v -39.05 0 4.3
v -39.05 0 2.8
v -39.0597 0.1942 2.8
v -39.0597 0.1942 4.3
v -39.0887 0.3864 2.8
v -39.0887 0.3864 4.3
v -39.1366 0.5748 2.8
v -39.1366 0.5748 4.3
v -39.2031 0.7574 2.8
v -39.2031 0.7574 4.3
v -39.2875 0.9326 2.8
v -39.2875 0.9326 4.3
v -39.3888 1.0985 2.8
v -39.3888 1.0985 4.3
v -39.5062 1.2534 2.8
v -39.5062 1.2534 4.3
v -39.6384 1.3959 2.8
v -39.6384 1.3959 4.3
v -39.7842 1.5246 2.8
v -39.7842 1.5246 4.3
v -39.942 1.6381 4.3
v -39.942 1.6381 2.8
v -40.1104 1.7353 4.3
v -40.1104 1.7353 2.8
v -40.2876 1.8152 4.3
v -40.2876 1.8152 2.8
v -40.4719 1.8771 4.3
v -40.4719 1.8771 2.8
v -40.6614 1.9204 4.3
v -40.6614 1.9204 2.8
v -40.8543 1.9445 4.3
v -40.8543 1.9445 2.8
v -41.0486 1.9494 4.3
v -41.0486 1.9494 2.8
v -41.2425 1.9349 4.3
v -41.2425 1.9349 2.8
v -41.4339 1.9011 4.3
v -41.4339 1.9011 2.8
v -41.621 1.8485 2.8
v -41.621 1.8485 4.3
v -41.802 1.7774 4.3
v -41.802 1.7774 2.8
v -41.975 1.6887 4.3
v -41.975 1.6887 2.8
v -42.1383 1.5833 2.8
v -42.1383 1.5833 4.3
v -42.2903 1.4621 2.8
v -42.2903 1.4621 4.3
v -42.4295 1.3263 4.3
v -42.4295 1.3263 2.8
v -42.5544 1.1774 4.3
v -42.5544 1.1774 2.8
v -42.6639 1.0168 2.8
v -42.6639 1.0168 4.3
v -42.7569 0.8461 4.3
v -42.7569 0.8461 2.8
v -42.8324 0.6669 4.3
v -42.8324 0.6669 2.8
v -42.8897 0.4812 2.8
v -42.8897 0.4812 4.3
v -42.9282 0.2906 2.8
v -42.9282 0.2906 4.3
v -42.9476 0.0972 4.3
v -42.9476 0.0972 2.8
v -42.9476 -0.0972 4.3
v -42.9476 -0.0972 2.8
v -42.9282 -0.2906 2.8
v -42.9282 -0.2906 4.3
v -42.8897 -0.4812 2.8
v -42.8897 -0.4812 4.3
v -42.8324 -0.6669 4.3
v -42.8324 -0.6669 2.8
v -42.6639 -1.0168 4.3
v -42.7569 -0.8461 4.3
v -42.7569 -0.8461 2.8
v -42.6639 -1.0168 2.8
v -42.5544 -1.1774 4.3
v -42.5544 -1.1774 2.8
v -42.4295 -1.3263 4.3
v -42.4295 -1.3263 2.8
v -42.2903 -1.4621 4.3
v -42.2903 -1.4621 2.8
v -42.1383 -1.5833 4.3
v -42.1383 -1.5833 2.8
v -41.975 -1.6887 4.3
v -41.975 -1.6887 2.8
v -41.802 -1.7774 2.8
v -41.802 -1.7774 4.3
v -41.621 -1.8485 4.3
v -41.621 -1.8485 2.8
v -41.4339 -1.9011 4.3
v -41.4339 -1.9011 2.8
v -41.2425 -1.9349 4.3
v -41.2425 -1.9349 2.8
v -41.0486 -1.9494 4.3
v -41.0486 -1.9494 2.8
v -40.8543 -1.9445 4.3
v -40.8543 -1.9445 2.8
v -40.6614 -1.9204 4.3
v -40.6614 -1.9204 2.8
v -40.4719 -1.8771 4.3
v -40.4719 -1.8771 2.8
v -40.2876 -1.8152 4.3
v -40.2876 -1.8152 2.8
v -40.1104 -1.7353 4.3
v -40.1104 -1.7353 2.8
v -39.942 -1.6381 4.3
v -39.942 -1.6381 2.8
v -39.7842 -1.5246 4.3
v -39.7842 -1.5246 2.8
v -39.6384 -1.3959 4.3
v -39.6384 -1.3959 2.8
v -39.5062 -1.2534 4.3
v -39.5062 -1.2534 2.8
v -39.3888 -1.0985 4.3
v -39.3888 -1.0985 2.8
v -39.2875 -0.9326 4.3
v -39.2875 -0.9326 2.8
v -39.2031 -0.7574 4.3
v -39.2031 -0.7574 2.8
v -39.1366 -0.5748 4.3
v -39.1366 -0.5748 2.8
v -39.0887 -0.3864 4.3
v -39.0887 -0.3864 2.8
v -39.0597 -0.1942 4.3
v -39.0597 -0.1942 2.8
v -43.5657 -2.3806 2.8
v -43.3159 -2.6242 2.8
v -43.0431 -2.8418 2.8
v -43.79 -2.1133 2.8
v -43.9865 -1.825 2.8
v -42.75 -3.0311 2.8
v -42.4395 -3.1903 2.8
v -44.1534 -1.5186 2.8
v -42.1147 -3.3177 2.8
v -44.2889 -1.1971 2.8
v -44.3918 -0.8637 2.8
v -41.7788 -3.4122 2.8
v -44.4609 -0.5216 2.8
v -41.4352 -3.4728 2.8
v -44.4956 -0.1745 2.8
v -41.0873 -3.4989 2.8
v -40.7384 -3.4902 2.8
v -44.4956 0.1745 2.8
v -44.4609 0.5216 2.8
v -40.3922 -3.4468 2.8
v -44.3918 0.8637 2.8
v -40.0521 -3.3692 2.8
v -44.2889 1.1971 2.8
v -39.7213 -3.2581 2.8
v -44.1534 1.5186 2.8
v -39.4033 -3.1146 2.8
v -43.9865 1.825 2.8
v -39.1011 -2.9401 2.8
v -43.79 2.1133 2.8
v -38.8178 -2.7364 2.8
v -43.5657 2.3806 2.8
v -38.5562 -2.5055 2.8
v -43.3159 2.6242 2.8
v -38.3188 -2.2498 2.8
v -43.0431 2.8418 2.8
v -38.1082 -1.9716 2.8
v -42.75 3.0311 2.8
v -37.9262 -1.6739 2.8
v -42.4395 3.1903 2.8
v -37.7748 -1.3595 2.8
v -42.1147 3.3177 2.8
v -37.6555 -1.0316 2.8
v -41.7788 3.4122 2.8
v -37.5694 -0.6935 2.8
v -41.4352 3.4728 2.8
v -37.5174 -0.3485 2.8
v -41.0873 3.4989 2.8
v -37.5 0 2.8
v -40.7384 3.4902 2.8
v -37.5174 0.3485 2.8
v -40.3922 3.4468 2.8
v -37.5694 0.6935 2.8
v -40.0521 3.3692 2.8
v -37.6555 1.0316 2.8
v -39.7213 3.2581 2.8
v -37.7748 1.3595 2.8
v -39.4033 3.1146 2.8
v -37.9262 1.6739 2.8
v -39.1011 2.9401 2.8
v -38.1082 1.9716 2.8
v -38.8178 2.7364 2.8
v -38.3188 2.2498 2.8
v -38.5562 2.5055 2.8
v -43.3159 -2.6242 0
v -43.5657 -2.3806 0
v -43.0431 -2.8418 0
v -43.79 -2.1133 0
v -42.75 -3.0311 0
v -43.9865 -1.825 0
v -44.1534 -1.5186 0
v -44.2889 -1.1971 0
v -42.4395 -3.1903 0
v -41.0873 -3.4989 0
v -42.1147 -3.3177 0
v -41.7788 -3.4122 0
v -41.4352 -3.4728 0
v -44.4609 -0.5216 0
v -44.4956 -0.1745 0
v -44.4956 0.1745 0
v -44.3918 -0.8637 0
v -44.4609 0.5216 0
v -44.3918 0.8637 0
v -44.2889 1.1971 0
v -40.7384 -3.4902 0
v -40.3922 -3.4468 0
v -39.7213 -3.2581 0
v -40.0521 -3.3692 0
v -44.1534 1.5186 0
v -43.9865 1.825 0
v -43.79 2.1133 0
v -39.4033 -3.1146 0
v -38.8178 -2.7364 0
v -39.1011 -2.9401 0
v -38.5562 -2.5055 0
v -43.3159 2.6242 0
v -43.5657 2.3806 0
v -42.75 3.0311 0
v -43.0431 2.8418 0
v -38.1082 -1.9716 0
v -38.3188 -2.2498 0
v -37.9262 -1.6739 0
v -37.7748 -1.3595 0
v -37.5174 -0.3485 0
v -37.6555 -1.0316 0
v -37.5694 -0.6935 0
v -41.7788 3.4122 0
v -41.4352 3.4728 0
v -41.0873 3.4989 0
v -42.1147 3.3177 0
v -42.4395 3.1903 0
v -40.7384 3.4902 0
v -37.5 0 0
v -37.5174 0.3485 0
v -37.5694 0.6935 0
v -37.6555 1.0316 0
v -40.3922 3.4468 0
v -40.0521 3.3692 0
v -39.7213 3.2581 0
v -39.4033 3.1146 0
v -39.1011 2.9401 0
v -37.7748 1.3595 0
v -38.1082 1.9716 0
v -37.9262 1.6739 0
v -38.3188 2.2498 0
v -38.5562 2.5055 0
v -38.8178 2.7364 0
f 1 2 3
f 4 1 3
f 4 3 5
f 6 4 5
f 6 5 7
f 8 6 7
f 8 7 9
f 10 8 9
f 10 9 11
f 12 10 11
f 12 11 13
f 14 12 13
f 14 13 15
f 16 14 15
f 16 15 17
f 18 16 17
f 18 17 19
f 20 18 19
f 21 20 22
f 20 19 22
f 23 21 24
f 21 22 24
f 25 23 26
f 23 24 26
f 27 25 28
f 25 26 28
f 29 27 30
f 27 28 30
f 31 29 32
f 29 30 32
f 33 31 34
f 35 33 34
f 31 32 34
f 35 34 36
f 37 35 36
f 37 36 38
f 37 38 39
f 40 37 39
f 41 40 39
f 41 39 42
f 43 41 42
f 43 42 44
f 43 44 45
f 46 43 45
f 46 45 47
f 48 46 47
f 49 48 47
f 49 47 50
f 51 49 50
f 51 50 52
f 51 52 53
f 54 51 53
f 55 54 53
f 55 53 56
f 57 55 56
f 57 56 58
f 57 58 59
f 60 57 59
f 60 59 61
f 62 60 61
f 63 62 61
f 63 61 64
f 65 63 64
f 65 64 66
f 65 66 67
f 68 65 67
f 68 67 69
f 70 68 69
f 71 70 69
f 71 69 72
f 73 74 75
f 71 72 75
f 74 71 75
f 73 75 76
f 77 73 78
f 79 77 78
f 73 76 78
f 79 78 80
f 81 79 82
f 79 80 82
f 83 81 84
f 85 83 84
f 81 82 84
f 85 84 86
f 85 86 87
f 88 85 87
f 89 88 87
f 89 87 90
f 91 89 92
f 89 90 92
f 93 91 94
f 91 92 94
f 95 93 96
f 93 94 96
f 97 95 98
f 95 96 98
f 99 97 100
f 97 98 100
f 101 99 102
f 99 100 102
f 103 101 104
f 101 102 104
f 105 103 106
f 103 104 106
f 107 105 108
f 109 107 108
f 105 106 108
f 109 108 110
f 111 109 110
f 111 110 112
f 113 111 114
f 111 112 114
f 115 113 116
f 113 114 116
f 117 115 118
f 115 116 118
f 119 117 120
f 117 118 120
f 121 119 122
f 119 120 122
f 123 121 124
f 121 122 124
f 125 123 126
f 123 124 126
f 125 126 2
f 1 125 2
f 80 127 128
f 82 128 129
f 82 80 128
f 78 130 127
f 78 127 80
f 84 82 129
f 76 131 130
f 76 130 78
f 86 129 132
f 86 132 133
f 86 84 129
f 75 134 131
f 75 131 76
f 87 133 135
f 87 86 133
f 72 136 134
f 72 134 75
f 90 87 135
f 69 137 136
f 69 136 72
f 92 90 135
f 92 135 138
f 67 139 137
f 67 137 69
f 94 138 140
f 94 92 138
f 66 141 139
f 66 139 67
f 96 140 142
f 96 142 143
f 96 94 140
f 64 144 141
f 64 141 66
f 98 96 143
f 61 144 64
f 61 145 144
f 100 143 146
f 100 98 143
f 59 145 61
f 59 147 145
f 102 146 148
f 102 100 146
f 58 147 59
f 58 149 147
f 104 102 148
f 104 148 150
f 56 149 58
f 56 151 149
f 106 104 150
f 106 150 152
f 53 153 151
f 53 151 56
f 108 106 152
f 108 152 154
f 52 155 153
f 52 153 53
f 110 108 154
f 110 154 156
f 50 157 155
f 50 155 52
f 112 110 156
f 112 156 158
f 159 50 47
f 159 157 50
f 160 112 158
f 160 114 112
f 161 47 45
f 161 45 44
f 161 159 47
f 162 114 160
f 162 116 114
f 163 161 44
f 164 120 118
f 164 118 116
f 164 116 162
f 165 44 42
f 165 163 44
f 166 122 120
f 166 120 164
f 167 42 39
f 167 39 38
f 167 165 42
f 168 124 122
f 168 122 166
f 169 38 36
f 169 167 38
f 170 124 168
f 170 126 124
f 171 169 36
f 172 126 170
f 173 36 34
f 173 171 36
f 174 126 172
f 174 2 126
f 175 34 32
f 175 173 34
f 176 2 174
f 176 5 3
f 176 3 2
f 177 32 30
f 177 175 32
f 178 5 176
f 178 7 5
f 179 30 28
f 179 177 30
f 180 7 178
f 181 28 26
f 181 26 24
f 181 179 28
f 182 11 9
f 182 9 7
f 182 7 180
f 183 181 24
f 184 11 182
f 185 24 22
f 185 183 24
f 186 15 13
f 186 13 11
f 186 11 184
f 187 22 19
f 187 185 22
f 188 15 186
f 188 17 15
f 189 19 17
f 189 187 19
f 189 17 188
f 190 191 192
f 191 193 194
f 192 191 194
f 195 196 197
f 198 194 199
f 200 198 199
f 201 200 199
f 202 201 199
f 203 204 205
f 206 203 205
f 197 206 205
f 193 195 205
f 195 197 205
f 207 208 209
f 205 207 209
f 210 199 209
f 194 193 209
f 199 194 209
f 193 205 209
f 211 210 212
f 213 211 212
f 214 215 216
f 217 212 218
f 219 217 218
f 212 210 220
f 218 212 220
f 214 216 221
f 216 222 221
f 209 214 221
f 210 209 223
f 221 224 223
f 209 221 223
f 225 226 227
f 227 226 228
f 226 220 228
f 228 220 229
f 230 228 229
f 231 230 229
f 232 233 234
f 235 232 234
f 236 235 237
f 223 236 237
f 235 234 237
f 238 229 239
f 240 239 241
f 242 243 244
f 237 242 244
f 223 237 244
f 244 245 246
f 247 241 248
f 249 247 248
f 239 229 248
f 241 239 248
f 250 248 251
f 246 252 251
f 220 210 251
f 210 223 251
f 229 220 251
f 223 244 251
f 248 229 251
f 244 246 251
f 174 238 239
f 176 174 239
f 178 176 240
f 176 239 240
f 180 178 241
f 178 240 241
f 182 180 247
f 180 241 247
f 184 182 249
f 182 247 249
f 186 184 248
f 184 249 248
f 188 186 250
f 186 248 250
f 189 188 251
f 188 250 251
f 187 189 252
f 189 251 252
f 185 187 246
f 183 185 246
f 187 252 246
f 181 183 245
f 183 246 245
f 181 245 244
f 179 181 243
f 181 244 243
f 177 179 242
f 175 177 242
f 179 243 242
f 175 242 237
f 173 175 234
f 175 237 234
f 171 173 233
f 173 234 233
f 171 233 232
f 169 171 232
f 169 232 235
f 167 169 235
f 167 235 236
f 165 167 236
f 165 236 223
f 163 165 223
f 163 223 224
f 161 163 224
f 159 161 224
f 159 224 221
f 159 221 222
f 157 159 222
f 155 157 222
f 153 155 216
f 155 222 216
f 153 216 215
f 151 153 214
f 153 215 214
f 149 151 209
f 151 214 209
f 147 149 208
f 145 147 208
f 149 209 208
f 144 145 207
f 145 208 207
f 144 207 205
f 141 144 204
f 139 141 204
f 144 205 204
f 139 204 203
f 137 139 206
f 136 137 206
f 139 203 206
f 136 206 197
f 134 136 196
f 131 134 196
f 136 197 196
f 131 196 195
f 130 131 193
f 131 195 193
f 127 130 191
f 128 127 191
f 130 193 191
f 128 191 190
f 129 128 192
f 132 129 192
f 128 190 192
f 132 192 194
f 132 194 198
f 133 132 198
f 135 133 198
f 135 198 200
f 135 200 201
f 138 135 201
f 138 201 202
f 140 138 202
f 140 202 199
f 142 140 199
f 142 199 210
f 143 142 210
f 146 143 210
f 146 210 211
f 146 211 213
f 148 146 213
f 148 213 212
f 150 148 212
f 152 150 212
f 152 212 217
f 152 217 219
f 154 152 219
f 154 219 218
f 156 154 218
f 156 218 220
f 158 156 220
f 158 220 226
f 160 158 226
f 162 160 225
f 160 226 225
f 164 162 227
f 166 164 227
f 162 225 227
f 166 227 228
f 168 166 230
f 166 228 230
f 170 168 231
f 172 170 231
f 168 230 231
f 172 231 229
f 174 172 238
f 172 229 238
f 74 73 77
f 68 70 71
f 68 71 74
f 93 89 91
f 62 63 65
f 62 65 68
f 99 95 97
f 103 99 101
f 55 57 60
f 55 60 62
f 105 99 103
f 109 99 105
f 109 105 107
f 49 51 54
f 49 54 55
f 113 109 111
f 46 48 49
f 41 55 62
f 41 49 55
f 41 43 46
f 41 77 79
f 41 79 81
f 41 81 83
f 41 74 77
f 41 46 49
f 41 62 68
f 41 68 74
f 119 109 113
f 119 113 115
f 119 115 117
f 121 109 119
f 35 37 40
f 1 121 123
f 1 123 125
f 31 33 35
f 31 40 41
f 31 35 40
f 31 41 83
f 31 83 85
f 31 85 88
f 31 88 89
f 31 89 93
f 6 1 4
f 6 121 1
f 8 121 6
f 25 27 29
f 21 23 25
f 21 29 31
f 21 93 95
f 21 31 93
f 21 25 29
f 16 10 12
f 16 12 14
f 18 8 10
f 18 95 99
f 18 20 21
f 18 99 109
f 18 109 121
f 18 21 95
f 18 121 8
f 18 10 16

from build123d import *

# Parameters (mm, degrees)
CYLINDER005_R     = 1.95
CYLINDER005_DEPTH = 4.3
CYLINDER006_R     = 3.5
CYLINDER006_DEPTH = 2.8


with BuildPart() as cylinder005:
    # Cylinder005 → Cylinder005 (new body)
    with BuildSketch(Plane.XY):
        Circle(CYLINDER005_R)
    extrude(amount=CYLINDER005_DEPTH)


with BuildPart() as pituto:
    # Cylinder006 → Cylinder006 (new body)
    with BuildSketch(Plane.XY):
        Circle(CYLINDER006_R)
    extrude(amount=CYLINDER006_DEPTH)

    # Fusion002: union Cylinder005
    add(cylinder005.part)


with BuildPart() as pituto_1:
    # Fusion002 placement: moved
    add(pituto.part.moved(Location((-41, 0, 0))))


solid = pituto_1.part
